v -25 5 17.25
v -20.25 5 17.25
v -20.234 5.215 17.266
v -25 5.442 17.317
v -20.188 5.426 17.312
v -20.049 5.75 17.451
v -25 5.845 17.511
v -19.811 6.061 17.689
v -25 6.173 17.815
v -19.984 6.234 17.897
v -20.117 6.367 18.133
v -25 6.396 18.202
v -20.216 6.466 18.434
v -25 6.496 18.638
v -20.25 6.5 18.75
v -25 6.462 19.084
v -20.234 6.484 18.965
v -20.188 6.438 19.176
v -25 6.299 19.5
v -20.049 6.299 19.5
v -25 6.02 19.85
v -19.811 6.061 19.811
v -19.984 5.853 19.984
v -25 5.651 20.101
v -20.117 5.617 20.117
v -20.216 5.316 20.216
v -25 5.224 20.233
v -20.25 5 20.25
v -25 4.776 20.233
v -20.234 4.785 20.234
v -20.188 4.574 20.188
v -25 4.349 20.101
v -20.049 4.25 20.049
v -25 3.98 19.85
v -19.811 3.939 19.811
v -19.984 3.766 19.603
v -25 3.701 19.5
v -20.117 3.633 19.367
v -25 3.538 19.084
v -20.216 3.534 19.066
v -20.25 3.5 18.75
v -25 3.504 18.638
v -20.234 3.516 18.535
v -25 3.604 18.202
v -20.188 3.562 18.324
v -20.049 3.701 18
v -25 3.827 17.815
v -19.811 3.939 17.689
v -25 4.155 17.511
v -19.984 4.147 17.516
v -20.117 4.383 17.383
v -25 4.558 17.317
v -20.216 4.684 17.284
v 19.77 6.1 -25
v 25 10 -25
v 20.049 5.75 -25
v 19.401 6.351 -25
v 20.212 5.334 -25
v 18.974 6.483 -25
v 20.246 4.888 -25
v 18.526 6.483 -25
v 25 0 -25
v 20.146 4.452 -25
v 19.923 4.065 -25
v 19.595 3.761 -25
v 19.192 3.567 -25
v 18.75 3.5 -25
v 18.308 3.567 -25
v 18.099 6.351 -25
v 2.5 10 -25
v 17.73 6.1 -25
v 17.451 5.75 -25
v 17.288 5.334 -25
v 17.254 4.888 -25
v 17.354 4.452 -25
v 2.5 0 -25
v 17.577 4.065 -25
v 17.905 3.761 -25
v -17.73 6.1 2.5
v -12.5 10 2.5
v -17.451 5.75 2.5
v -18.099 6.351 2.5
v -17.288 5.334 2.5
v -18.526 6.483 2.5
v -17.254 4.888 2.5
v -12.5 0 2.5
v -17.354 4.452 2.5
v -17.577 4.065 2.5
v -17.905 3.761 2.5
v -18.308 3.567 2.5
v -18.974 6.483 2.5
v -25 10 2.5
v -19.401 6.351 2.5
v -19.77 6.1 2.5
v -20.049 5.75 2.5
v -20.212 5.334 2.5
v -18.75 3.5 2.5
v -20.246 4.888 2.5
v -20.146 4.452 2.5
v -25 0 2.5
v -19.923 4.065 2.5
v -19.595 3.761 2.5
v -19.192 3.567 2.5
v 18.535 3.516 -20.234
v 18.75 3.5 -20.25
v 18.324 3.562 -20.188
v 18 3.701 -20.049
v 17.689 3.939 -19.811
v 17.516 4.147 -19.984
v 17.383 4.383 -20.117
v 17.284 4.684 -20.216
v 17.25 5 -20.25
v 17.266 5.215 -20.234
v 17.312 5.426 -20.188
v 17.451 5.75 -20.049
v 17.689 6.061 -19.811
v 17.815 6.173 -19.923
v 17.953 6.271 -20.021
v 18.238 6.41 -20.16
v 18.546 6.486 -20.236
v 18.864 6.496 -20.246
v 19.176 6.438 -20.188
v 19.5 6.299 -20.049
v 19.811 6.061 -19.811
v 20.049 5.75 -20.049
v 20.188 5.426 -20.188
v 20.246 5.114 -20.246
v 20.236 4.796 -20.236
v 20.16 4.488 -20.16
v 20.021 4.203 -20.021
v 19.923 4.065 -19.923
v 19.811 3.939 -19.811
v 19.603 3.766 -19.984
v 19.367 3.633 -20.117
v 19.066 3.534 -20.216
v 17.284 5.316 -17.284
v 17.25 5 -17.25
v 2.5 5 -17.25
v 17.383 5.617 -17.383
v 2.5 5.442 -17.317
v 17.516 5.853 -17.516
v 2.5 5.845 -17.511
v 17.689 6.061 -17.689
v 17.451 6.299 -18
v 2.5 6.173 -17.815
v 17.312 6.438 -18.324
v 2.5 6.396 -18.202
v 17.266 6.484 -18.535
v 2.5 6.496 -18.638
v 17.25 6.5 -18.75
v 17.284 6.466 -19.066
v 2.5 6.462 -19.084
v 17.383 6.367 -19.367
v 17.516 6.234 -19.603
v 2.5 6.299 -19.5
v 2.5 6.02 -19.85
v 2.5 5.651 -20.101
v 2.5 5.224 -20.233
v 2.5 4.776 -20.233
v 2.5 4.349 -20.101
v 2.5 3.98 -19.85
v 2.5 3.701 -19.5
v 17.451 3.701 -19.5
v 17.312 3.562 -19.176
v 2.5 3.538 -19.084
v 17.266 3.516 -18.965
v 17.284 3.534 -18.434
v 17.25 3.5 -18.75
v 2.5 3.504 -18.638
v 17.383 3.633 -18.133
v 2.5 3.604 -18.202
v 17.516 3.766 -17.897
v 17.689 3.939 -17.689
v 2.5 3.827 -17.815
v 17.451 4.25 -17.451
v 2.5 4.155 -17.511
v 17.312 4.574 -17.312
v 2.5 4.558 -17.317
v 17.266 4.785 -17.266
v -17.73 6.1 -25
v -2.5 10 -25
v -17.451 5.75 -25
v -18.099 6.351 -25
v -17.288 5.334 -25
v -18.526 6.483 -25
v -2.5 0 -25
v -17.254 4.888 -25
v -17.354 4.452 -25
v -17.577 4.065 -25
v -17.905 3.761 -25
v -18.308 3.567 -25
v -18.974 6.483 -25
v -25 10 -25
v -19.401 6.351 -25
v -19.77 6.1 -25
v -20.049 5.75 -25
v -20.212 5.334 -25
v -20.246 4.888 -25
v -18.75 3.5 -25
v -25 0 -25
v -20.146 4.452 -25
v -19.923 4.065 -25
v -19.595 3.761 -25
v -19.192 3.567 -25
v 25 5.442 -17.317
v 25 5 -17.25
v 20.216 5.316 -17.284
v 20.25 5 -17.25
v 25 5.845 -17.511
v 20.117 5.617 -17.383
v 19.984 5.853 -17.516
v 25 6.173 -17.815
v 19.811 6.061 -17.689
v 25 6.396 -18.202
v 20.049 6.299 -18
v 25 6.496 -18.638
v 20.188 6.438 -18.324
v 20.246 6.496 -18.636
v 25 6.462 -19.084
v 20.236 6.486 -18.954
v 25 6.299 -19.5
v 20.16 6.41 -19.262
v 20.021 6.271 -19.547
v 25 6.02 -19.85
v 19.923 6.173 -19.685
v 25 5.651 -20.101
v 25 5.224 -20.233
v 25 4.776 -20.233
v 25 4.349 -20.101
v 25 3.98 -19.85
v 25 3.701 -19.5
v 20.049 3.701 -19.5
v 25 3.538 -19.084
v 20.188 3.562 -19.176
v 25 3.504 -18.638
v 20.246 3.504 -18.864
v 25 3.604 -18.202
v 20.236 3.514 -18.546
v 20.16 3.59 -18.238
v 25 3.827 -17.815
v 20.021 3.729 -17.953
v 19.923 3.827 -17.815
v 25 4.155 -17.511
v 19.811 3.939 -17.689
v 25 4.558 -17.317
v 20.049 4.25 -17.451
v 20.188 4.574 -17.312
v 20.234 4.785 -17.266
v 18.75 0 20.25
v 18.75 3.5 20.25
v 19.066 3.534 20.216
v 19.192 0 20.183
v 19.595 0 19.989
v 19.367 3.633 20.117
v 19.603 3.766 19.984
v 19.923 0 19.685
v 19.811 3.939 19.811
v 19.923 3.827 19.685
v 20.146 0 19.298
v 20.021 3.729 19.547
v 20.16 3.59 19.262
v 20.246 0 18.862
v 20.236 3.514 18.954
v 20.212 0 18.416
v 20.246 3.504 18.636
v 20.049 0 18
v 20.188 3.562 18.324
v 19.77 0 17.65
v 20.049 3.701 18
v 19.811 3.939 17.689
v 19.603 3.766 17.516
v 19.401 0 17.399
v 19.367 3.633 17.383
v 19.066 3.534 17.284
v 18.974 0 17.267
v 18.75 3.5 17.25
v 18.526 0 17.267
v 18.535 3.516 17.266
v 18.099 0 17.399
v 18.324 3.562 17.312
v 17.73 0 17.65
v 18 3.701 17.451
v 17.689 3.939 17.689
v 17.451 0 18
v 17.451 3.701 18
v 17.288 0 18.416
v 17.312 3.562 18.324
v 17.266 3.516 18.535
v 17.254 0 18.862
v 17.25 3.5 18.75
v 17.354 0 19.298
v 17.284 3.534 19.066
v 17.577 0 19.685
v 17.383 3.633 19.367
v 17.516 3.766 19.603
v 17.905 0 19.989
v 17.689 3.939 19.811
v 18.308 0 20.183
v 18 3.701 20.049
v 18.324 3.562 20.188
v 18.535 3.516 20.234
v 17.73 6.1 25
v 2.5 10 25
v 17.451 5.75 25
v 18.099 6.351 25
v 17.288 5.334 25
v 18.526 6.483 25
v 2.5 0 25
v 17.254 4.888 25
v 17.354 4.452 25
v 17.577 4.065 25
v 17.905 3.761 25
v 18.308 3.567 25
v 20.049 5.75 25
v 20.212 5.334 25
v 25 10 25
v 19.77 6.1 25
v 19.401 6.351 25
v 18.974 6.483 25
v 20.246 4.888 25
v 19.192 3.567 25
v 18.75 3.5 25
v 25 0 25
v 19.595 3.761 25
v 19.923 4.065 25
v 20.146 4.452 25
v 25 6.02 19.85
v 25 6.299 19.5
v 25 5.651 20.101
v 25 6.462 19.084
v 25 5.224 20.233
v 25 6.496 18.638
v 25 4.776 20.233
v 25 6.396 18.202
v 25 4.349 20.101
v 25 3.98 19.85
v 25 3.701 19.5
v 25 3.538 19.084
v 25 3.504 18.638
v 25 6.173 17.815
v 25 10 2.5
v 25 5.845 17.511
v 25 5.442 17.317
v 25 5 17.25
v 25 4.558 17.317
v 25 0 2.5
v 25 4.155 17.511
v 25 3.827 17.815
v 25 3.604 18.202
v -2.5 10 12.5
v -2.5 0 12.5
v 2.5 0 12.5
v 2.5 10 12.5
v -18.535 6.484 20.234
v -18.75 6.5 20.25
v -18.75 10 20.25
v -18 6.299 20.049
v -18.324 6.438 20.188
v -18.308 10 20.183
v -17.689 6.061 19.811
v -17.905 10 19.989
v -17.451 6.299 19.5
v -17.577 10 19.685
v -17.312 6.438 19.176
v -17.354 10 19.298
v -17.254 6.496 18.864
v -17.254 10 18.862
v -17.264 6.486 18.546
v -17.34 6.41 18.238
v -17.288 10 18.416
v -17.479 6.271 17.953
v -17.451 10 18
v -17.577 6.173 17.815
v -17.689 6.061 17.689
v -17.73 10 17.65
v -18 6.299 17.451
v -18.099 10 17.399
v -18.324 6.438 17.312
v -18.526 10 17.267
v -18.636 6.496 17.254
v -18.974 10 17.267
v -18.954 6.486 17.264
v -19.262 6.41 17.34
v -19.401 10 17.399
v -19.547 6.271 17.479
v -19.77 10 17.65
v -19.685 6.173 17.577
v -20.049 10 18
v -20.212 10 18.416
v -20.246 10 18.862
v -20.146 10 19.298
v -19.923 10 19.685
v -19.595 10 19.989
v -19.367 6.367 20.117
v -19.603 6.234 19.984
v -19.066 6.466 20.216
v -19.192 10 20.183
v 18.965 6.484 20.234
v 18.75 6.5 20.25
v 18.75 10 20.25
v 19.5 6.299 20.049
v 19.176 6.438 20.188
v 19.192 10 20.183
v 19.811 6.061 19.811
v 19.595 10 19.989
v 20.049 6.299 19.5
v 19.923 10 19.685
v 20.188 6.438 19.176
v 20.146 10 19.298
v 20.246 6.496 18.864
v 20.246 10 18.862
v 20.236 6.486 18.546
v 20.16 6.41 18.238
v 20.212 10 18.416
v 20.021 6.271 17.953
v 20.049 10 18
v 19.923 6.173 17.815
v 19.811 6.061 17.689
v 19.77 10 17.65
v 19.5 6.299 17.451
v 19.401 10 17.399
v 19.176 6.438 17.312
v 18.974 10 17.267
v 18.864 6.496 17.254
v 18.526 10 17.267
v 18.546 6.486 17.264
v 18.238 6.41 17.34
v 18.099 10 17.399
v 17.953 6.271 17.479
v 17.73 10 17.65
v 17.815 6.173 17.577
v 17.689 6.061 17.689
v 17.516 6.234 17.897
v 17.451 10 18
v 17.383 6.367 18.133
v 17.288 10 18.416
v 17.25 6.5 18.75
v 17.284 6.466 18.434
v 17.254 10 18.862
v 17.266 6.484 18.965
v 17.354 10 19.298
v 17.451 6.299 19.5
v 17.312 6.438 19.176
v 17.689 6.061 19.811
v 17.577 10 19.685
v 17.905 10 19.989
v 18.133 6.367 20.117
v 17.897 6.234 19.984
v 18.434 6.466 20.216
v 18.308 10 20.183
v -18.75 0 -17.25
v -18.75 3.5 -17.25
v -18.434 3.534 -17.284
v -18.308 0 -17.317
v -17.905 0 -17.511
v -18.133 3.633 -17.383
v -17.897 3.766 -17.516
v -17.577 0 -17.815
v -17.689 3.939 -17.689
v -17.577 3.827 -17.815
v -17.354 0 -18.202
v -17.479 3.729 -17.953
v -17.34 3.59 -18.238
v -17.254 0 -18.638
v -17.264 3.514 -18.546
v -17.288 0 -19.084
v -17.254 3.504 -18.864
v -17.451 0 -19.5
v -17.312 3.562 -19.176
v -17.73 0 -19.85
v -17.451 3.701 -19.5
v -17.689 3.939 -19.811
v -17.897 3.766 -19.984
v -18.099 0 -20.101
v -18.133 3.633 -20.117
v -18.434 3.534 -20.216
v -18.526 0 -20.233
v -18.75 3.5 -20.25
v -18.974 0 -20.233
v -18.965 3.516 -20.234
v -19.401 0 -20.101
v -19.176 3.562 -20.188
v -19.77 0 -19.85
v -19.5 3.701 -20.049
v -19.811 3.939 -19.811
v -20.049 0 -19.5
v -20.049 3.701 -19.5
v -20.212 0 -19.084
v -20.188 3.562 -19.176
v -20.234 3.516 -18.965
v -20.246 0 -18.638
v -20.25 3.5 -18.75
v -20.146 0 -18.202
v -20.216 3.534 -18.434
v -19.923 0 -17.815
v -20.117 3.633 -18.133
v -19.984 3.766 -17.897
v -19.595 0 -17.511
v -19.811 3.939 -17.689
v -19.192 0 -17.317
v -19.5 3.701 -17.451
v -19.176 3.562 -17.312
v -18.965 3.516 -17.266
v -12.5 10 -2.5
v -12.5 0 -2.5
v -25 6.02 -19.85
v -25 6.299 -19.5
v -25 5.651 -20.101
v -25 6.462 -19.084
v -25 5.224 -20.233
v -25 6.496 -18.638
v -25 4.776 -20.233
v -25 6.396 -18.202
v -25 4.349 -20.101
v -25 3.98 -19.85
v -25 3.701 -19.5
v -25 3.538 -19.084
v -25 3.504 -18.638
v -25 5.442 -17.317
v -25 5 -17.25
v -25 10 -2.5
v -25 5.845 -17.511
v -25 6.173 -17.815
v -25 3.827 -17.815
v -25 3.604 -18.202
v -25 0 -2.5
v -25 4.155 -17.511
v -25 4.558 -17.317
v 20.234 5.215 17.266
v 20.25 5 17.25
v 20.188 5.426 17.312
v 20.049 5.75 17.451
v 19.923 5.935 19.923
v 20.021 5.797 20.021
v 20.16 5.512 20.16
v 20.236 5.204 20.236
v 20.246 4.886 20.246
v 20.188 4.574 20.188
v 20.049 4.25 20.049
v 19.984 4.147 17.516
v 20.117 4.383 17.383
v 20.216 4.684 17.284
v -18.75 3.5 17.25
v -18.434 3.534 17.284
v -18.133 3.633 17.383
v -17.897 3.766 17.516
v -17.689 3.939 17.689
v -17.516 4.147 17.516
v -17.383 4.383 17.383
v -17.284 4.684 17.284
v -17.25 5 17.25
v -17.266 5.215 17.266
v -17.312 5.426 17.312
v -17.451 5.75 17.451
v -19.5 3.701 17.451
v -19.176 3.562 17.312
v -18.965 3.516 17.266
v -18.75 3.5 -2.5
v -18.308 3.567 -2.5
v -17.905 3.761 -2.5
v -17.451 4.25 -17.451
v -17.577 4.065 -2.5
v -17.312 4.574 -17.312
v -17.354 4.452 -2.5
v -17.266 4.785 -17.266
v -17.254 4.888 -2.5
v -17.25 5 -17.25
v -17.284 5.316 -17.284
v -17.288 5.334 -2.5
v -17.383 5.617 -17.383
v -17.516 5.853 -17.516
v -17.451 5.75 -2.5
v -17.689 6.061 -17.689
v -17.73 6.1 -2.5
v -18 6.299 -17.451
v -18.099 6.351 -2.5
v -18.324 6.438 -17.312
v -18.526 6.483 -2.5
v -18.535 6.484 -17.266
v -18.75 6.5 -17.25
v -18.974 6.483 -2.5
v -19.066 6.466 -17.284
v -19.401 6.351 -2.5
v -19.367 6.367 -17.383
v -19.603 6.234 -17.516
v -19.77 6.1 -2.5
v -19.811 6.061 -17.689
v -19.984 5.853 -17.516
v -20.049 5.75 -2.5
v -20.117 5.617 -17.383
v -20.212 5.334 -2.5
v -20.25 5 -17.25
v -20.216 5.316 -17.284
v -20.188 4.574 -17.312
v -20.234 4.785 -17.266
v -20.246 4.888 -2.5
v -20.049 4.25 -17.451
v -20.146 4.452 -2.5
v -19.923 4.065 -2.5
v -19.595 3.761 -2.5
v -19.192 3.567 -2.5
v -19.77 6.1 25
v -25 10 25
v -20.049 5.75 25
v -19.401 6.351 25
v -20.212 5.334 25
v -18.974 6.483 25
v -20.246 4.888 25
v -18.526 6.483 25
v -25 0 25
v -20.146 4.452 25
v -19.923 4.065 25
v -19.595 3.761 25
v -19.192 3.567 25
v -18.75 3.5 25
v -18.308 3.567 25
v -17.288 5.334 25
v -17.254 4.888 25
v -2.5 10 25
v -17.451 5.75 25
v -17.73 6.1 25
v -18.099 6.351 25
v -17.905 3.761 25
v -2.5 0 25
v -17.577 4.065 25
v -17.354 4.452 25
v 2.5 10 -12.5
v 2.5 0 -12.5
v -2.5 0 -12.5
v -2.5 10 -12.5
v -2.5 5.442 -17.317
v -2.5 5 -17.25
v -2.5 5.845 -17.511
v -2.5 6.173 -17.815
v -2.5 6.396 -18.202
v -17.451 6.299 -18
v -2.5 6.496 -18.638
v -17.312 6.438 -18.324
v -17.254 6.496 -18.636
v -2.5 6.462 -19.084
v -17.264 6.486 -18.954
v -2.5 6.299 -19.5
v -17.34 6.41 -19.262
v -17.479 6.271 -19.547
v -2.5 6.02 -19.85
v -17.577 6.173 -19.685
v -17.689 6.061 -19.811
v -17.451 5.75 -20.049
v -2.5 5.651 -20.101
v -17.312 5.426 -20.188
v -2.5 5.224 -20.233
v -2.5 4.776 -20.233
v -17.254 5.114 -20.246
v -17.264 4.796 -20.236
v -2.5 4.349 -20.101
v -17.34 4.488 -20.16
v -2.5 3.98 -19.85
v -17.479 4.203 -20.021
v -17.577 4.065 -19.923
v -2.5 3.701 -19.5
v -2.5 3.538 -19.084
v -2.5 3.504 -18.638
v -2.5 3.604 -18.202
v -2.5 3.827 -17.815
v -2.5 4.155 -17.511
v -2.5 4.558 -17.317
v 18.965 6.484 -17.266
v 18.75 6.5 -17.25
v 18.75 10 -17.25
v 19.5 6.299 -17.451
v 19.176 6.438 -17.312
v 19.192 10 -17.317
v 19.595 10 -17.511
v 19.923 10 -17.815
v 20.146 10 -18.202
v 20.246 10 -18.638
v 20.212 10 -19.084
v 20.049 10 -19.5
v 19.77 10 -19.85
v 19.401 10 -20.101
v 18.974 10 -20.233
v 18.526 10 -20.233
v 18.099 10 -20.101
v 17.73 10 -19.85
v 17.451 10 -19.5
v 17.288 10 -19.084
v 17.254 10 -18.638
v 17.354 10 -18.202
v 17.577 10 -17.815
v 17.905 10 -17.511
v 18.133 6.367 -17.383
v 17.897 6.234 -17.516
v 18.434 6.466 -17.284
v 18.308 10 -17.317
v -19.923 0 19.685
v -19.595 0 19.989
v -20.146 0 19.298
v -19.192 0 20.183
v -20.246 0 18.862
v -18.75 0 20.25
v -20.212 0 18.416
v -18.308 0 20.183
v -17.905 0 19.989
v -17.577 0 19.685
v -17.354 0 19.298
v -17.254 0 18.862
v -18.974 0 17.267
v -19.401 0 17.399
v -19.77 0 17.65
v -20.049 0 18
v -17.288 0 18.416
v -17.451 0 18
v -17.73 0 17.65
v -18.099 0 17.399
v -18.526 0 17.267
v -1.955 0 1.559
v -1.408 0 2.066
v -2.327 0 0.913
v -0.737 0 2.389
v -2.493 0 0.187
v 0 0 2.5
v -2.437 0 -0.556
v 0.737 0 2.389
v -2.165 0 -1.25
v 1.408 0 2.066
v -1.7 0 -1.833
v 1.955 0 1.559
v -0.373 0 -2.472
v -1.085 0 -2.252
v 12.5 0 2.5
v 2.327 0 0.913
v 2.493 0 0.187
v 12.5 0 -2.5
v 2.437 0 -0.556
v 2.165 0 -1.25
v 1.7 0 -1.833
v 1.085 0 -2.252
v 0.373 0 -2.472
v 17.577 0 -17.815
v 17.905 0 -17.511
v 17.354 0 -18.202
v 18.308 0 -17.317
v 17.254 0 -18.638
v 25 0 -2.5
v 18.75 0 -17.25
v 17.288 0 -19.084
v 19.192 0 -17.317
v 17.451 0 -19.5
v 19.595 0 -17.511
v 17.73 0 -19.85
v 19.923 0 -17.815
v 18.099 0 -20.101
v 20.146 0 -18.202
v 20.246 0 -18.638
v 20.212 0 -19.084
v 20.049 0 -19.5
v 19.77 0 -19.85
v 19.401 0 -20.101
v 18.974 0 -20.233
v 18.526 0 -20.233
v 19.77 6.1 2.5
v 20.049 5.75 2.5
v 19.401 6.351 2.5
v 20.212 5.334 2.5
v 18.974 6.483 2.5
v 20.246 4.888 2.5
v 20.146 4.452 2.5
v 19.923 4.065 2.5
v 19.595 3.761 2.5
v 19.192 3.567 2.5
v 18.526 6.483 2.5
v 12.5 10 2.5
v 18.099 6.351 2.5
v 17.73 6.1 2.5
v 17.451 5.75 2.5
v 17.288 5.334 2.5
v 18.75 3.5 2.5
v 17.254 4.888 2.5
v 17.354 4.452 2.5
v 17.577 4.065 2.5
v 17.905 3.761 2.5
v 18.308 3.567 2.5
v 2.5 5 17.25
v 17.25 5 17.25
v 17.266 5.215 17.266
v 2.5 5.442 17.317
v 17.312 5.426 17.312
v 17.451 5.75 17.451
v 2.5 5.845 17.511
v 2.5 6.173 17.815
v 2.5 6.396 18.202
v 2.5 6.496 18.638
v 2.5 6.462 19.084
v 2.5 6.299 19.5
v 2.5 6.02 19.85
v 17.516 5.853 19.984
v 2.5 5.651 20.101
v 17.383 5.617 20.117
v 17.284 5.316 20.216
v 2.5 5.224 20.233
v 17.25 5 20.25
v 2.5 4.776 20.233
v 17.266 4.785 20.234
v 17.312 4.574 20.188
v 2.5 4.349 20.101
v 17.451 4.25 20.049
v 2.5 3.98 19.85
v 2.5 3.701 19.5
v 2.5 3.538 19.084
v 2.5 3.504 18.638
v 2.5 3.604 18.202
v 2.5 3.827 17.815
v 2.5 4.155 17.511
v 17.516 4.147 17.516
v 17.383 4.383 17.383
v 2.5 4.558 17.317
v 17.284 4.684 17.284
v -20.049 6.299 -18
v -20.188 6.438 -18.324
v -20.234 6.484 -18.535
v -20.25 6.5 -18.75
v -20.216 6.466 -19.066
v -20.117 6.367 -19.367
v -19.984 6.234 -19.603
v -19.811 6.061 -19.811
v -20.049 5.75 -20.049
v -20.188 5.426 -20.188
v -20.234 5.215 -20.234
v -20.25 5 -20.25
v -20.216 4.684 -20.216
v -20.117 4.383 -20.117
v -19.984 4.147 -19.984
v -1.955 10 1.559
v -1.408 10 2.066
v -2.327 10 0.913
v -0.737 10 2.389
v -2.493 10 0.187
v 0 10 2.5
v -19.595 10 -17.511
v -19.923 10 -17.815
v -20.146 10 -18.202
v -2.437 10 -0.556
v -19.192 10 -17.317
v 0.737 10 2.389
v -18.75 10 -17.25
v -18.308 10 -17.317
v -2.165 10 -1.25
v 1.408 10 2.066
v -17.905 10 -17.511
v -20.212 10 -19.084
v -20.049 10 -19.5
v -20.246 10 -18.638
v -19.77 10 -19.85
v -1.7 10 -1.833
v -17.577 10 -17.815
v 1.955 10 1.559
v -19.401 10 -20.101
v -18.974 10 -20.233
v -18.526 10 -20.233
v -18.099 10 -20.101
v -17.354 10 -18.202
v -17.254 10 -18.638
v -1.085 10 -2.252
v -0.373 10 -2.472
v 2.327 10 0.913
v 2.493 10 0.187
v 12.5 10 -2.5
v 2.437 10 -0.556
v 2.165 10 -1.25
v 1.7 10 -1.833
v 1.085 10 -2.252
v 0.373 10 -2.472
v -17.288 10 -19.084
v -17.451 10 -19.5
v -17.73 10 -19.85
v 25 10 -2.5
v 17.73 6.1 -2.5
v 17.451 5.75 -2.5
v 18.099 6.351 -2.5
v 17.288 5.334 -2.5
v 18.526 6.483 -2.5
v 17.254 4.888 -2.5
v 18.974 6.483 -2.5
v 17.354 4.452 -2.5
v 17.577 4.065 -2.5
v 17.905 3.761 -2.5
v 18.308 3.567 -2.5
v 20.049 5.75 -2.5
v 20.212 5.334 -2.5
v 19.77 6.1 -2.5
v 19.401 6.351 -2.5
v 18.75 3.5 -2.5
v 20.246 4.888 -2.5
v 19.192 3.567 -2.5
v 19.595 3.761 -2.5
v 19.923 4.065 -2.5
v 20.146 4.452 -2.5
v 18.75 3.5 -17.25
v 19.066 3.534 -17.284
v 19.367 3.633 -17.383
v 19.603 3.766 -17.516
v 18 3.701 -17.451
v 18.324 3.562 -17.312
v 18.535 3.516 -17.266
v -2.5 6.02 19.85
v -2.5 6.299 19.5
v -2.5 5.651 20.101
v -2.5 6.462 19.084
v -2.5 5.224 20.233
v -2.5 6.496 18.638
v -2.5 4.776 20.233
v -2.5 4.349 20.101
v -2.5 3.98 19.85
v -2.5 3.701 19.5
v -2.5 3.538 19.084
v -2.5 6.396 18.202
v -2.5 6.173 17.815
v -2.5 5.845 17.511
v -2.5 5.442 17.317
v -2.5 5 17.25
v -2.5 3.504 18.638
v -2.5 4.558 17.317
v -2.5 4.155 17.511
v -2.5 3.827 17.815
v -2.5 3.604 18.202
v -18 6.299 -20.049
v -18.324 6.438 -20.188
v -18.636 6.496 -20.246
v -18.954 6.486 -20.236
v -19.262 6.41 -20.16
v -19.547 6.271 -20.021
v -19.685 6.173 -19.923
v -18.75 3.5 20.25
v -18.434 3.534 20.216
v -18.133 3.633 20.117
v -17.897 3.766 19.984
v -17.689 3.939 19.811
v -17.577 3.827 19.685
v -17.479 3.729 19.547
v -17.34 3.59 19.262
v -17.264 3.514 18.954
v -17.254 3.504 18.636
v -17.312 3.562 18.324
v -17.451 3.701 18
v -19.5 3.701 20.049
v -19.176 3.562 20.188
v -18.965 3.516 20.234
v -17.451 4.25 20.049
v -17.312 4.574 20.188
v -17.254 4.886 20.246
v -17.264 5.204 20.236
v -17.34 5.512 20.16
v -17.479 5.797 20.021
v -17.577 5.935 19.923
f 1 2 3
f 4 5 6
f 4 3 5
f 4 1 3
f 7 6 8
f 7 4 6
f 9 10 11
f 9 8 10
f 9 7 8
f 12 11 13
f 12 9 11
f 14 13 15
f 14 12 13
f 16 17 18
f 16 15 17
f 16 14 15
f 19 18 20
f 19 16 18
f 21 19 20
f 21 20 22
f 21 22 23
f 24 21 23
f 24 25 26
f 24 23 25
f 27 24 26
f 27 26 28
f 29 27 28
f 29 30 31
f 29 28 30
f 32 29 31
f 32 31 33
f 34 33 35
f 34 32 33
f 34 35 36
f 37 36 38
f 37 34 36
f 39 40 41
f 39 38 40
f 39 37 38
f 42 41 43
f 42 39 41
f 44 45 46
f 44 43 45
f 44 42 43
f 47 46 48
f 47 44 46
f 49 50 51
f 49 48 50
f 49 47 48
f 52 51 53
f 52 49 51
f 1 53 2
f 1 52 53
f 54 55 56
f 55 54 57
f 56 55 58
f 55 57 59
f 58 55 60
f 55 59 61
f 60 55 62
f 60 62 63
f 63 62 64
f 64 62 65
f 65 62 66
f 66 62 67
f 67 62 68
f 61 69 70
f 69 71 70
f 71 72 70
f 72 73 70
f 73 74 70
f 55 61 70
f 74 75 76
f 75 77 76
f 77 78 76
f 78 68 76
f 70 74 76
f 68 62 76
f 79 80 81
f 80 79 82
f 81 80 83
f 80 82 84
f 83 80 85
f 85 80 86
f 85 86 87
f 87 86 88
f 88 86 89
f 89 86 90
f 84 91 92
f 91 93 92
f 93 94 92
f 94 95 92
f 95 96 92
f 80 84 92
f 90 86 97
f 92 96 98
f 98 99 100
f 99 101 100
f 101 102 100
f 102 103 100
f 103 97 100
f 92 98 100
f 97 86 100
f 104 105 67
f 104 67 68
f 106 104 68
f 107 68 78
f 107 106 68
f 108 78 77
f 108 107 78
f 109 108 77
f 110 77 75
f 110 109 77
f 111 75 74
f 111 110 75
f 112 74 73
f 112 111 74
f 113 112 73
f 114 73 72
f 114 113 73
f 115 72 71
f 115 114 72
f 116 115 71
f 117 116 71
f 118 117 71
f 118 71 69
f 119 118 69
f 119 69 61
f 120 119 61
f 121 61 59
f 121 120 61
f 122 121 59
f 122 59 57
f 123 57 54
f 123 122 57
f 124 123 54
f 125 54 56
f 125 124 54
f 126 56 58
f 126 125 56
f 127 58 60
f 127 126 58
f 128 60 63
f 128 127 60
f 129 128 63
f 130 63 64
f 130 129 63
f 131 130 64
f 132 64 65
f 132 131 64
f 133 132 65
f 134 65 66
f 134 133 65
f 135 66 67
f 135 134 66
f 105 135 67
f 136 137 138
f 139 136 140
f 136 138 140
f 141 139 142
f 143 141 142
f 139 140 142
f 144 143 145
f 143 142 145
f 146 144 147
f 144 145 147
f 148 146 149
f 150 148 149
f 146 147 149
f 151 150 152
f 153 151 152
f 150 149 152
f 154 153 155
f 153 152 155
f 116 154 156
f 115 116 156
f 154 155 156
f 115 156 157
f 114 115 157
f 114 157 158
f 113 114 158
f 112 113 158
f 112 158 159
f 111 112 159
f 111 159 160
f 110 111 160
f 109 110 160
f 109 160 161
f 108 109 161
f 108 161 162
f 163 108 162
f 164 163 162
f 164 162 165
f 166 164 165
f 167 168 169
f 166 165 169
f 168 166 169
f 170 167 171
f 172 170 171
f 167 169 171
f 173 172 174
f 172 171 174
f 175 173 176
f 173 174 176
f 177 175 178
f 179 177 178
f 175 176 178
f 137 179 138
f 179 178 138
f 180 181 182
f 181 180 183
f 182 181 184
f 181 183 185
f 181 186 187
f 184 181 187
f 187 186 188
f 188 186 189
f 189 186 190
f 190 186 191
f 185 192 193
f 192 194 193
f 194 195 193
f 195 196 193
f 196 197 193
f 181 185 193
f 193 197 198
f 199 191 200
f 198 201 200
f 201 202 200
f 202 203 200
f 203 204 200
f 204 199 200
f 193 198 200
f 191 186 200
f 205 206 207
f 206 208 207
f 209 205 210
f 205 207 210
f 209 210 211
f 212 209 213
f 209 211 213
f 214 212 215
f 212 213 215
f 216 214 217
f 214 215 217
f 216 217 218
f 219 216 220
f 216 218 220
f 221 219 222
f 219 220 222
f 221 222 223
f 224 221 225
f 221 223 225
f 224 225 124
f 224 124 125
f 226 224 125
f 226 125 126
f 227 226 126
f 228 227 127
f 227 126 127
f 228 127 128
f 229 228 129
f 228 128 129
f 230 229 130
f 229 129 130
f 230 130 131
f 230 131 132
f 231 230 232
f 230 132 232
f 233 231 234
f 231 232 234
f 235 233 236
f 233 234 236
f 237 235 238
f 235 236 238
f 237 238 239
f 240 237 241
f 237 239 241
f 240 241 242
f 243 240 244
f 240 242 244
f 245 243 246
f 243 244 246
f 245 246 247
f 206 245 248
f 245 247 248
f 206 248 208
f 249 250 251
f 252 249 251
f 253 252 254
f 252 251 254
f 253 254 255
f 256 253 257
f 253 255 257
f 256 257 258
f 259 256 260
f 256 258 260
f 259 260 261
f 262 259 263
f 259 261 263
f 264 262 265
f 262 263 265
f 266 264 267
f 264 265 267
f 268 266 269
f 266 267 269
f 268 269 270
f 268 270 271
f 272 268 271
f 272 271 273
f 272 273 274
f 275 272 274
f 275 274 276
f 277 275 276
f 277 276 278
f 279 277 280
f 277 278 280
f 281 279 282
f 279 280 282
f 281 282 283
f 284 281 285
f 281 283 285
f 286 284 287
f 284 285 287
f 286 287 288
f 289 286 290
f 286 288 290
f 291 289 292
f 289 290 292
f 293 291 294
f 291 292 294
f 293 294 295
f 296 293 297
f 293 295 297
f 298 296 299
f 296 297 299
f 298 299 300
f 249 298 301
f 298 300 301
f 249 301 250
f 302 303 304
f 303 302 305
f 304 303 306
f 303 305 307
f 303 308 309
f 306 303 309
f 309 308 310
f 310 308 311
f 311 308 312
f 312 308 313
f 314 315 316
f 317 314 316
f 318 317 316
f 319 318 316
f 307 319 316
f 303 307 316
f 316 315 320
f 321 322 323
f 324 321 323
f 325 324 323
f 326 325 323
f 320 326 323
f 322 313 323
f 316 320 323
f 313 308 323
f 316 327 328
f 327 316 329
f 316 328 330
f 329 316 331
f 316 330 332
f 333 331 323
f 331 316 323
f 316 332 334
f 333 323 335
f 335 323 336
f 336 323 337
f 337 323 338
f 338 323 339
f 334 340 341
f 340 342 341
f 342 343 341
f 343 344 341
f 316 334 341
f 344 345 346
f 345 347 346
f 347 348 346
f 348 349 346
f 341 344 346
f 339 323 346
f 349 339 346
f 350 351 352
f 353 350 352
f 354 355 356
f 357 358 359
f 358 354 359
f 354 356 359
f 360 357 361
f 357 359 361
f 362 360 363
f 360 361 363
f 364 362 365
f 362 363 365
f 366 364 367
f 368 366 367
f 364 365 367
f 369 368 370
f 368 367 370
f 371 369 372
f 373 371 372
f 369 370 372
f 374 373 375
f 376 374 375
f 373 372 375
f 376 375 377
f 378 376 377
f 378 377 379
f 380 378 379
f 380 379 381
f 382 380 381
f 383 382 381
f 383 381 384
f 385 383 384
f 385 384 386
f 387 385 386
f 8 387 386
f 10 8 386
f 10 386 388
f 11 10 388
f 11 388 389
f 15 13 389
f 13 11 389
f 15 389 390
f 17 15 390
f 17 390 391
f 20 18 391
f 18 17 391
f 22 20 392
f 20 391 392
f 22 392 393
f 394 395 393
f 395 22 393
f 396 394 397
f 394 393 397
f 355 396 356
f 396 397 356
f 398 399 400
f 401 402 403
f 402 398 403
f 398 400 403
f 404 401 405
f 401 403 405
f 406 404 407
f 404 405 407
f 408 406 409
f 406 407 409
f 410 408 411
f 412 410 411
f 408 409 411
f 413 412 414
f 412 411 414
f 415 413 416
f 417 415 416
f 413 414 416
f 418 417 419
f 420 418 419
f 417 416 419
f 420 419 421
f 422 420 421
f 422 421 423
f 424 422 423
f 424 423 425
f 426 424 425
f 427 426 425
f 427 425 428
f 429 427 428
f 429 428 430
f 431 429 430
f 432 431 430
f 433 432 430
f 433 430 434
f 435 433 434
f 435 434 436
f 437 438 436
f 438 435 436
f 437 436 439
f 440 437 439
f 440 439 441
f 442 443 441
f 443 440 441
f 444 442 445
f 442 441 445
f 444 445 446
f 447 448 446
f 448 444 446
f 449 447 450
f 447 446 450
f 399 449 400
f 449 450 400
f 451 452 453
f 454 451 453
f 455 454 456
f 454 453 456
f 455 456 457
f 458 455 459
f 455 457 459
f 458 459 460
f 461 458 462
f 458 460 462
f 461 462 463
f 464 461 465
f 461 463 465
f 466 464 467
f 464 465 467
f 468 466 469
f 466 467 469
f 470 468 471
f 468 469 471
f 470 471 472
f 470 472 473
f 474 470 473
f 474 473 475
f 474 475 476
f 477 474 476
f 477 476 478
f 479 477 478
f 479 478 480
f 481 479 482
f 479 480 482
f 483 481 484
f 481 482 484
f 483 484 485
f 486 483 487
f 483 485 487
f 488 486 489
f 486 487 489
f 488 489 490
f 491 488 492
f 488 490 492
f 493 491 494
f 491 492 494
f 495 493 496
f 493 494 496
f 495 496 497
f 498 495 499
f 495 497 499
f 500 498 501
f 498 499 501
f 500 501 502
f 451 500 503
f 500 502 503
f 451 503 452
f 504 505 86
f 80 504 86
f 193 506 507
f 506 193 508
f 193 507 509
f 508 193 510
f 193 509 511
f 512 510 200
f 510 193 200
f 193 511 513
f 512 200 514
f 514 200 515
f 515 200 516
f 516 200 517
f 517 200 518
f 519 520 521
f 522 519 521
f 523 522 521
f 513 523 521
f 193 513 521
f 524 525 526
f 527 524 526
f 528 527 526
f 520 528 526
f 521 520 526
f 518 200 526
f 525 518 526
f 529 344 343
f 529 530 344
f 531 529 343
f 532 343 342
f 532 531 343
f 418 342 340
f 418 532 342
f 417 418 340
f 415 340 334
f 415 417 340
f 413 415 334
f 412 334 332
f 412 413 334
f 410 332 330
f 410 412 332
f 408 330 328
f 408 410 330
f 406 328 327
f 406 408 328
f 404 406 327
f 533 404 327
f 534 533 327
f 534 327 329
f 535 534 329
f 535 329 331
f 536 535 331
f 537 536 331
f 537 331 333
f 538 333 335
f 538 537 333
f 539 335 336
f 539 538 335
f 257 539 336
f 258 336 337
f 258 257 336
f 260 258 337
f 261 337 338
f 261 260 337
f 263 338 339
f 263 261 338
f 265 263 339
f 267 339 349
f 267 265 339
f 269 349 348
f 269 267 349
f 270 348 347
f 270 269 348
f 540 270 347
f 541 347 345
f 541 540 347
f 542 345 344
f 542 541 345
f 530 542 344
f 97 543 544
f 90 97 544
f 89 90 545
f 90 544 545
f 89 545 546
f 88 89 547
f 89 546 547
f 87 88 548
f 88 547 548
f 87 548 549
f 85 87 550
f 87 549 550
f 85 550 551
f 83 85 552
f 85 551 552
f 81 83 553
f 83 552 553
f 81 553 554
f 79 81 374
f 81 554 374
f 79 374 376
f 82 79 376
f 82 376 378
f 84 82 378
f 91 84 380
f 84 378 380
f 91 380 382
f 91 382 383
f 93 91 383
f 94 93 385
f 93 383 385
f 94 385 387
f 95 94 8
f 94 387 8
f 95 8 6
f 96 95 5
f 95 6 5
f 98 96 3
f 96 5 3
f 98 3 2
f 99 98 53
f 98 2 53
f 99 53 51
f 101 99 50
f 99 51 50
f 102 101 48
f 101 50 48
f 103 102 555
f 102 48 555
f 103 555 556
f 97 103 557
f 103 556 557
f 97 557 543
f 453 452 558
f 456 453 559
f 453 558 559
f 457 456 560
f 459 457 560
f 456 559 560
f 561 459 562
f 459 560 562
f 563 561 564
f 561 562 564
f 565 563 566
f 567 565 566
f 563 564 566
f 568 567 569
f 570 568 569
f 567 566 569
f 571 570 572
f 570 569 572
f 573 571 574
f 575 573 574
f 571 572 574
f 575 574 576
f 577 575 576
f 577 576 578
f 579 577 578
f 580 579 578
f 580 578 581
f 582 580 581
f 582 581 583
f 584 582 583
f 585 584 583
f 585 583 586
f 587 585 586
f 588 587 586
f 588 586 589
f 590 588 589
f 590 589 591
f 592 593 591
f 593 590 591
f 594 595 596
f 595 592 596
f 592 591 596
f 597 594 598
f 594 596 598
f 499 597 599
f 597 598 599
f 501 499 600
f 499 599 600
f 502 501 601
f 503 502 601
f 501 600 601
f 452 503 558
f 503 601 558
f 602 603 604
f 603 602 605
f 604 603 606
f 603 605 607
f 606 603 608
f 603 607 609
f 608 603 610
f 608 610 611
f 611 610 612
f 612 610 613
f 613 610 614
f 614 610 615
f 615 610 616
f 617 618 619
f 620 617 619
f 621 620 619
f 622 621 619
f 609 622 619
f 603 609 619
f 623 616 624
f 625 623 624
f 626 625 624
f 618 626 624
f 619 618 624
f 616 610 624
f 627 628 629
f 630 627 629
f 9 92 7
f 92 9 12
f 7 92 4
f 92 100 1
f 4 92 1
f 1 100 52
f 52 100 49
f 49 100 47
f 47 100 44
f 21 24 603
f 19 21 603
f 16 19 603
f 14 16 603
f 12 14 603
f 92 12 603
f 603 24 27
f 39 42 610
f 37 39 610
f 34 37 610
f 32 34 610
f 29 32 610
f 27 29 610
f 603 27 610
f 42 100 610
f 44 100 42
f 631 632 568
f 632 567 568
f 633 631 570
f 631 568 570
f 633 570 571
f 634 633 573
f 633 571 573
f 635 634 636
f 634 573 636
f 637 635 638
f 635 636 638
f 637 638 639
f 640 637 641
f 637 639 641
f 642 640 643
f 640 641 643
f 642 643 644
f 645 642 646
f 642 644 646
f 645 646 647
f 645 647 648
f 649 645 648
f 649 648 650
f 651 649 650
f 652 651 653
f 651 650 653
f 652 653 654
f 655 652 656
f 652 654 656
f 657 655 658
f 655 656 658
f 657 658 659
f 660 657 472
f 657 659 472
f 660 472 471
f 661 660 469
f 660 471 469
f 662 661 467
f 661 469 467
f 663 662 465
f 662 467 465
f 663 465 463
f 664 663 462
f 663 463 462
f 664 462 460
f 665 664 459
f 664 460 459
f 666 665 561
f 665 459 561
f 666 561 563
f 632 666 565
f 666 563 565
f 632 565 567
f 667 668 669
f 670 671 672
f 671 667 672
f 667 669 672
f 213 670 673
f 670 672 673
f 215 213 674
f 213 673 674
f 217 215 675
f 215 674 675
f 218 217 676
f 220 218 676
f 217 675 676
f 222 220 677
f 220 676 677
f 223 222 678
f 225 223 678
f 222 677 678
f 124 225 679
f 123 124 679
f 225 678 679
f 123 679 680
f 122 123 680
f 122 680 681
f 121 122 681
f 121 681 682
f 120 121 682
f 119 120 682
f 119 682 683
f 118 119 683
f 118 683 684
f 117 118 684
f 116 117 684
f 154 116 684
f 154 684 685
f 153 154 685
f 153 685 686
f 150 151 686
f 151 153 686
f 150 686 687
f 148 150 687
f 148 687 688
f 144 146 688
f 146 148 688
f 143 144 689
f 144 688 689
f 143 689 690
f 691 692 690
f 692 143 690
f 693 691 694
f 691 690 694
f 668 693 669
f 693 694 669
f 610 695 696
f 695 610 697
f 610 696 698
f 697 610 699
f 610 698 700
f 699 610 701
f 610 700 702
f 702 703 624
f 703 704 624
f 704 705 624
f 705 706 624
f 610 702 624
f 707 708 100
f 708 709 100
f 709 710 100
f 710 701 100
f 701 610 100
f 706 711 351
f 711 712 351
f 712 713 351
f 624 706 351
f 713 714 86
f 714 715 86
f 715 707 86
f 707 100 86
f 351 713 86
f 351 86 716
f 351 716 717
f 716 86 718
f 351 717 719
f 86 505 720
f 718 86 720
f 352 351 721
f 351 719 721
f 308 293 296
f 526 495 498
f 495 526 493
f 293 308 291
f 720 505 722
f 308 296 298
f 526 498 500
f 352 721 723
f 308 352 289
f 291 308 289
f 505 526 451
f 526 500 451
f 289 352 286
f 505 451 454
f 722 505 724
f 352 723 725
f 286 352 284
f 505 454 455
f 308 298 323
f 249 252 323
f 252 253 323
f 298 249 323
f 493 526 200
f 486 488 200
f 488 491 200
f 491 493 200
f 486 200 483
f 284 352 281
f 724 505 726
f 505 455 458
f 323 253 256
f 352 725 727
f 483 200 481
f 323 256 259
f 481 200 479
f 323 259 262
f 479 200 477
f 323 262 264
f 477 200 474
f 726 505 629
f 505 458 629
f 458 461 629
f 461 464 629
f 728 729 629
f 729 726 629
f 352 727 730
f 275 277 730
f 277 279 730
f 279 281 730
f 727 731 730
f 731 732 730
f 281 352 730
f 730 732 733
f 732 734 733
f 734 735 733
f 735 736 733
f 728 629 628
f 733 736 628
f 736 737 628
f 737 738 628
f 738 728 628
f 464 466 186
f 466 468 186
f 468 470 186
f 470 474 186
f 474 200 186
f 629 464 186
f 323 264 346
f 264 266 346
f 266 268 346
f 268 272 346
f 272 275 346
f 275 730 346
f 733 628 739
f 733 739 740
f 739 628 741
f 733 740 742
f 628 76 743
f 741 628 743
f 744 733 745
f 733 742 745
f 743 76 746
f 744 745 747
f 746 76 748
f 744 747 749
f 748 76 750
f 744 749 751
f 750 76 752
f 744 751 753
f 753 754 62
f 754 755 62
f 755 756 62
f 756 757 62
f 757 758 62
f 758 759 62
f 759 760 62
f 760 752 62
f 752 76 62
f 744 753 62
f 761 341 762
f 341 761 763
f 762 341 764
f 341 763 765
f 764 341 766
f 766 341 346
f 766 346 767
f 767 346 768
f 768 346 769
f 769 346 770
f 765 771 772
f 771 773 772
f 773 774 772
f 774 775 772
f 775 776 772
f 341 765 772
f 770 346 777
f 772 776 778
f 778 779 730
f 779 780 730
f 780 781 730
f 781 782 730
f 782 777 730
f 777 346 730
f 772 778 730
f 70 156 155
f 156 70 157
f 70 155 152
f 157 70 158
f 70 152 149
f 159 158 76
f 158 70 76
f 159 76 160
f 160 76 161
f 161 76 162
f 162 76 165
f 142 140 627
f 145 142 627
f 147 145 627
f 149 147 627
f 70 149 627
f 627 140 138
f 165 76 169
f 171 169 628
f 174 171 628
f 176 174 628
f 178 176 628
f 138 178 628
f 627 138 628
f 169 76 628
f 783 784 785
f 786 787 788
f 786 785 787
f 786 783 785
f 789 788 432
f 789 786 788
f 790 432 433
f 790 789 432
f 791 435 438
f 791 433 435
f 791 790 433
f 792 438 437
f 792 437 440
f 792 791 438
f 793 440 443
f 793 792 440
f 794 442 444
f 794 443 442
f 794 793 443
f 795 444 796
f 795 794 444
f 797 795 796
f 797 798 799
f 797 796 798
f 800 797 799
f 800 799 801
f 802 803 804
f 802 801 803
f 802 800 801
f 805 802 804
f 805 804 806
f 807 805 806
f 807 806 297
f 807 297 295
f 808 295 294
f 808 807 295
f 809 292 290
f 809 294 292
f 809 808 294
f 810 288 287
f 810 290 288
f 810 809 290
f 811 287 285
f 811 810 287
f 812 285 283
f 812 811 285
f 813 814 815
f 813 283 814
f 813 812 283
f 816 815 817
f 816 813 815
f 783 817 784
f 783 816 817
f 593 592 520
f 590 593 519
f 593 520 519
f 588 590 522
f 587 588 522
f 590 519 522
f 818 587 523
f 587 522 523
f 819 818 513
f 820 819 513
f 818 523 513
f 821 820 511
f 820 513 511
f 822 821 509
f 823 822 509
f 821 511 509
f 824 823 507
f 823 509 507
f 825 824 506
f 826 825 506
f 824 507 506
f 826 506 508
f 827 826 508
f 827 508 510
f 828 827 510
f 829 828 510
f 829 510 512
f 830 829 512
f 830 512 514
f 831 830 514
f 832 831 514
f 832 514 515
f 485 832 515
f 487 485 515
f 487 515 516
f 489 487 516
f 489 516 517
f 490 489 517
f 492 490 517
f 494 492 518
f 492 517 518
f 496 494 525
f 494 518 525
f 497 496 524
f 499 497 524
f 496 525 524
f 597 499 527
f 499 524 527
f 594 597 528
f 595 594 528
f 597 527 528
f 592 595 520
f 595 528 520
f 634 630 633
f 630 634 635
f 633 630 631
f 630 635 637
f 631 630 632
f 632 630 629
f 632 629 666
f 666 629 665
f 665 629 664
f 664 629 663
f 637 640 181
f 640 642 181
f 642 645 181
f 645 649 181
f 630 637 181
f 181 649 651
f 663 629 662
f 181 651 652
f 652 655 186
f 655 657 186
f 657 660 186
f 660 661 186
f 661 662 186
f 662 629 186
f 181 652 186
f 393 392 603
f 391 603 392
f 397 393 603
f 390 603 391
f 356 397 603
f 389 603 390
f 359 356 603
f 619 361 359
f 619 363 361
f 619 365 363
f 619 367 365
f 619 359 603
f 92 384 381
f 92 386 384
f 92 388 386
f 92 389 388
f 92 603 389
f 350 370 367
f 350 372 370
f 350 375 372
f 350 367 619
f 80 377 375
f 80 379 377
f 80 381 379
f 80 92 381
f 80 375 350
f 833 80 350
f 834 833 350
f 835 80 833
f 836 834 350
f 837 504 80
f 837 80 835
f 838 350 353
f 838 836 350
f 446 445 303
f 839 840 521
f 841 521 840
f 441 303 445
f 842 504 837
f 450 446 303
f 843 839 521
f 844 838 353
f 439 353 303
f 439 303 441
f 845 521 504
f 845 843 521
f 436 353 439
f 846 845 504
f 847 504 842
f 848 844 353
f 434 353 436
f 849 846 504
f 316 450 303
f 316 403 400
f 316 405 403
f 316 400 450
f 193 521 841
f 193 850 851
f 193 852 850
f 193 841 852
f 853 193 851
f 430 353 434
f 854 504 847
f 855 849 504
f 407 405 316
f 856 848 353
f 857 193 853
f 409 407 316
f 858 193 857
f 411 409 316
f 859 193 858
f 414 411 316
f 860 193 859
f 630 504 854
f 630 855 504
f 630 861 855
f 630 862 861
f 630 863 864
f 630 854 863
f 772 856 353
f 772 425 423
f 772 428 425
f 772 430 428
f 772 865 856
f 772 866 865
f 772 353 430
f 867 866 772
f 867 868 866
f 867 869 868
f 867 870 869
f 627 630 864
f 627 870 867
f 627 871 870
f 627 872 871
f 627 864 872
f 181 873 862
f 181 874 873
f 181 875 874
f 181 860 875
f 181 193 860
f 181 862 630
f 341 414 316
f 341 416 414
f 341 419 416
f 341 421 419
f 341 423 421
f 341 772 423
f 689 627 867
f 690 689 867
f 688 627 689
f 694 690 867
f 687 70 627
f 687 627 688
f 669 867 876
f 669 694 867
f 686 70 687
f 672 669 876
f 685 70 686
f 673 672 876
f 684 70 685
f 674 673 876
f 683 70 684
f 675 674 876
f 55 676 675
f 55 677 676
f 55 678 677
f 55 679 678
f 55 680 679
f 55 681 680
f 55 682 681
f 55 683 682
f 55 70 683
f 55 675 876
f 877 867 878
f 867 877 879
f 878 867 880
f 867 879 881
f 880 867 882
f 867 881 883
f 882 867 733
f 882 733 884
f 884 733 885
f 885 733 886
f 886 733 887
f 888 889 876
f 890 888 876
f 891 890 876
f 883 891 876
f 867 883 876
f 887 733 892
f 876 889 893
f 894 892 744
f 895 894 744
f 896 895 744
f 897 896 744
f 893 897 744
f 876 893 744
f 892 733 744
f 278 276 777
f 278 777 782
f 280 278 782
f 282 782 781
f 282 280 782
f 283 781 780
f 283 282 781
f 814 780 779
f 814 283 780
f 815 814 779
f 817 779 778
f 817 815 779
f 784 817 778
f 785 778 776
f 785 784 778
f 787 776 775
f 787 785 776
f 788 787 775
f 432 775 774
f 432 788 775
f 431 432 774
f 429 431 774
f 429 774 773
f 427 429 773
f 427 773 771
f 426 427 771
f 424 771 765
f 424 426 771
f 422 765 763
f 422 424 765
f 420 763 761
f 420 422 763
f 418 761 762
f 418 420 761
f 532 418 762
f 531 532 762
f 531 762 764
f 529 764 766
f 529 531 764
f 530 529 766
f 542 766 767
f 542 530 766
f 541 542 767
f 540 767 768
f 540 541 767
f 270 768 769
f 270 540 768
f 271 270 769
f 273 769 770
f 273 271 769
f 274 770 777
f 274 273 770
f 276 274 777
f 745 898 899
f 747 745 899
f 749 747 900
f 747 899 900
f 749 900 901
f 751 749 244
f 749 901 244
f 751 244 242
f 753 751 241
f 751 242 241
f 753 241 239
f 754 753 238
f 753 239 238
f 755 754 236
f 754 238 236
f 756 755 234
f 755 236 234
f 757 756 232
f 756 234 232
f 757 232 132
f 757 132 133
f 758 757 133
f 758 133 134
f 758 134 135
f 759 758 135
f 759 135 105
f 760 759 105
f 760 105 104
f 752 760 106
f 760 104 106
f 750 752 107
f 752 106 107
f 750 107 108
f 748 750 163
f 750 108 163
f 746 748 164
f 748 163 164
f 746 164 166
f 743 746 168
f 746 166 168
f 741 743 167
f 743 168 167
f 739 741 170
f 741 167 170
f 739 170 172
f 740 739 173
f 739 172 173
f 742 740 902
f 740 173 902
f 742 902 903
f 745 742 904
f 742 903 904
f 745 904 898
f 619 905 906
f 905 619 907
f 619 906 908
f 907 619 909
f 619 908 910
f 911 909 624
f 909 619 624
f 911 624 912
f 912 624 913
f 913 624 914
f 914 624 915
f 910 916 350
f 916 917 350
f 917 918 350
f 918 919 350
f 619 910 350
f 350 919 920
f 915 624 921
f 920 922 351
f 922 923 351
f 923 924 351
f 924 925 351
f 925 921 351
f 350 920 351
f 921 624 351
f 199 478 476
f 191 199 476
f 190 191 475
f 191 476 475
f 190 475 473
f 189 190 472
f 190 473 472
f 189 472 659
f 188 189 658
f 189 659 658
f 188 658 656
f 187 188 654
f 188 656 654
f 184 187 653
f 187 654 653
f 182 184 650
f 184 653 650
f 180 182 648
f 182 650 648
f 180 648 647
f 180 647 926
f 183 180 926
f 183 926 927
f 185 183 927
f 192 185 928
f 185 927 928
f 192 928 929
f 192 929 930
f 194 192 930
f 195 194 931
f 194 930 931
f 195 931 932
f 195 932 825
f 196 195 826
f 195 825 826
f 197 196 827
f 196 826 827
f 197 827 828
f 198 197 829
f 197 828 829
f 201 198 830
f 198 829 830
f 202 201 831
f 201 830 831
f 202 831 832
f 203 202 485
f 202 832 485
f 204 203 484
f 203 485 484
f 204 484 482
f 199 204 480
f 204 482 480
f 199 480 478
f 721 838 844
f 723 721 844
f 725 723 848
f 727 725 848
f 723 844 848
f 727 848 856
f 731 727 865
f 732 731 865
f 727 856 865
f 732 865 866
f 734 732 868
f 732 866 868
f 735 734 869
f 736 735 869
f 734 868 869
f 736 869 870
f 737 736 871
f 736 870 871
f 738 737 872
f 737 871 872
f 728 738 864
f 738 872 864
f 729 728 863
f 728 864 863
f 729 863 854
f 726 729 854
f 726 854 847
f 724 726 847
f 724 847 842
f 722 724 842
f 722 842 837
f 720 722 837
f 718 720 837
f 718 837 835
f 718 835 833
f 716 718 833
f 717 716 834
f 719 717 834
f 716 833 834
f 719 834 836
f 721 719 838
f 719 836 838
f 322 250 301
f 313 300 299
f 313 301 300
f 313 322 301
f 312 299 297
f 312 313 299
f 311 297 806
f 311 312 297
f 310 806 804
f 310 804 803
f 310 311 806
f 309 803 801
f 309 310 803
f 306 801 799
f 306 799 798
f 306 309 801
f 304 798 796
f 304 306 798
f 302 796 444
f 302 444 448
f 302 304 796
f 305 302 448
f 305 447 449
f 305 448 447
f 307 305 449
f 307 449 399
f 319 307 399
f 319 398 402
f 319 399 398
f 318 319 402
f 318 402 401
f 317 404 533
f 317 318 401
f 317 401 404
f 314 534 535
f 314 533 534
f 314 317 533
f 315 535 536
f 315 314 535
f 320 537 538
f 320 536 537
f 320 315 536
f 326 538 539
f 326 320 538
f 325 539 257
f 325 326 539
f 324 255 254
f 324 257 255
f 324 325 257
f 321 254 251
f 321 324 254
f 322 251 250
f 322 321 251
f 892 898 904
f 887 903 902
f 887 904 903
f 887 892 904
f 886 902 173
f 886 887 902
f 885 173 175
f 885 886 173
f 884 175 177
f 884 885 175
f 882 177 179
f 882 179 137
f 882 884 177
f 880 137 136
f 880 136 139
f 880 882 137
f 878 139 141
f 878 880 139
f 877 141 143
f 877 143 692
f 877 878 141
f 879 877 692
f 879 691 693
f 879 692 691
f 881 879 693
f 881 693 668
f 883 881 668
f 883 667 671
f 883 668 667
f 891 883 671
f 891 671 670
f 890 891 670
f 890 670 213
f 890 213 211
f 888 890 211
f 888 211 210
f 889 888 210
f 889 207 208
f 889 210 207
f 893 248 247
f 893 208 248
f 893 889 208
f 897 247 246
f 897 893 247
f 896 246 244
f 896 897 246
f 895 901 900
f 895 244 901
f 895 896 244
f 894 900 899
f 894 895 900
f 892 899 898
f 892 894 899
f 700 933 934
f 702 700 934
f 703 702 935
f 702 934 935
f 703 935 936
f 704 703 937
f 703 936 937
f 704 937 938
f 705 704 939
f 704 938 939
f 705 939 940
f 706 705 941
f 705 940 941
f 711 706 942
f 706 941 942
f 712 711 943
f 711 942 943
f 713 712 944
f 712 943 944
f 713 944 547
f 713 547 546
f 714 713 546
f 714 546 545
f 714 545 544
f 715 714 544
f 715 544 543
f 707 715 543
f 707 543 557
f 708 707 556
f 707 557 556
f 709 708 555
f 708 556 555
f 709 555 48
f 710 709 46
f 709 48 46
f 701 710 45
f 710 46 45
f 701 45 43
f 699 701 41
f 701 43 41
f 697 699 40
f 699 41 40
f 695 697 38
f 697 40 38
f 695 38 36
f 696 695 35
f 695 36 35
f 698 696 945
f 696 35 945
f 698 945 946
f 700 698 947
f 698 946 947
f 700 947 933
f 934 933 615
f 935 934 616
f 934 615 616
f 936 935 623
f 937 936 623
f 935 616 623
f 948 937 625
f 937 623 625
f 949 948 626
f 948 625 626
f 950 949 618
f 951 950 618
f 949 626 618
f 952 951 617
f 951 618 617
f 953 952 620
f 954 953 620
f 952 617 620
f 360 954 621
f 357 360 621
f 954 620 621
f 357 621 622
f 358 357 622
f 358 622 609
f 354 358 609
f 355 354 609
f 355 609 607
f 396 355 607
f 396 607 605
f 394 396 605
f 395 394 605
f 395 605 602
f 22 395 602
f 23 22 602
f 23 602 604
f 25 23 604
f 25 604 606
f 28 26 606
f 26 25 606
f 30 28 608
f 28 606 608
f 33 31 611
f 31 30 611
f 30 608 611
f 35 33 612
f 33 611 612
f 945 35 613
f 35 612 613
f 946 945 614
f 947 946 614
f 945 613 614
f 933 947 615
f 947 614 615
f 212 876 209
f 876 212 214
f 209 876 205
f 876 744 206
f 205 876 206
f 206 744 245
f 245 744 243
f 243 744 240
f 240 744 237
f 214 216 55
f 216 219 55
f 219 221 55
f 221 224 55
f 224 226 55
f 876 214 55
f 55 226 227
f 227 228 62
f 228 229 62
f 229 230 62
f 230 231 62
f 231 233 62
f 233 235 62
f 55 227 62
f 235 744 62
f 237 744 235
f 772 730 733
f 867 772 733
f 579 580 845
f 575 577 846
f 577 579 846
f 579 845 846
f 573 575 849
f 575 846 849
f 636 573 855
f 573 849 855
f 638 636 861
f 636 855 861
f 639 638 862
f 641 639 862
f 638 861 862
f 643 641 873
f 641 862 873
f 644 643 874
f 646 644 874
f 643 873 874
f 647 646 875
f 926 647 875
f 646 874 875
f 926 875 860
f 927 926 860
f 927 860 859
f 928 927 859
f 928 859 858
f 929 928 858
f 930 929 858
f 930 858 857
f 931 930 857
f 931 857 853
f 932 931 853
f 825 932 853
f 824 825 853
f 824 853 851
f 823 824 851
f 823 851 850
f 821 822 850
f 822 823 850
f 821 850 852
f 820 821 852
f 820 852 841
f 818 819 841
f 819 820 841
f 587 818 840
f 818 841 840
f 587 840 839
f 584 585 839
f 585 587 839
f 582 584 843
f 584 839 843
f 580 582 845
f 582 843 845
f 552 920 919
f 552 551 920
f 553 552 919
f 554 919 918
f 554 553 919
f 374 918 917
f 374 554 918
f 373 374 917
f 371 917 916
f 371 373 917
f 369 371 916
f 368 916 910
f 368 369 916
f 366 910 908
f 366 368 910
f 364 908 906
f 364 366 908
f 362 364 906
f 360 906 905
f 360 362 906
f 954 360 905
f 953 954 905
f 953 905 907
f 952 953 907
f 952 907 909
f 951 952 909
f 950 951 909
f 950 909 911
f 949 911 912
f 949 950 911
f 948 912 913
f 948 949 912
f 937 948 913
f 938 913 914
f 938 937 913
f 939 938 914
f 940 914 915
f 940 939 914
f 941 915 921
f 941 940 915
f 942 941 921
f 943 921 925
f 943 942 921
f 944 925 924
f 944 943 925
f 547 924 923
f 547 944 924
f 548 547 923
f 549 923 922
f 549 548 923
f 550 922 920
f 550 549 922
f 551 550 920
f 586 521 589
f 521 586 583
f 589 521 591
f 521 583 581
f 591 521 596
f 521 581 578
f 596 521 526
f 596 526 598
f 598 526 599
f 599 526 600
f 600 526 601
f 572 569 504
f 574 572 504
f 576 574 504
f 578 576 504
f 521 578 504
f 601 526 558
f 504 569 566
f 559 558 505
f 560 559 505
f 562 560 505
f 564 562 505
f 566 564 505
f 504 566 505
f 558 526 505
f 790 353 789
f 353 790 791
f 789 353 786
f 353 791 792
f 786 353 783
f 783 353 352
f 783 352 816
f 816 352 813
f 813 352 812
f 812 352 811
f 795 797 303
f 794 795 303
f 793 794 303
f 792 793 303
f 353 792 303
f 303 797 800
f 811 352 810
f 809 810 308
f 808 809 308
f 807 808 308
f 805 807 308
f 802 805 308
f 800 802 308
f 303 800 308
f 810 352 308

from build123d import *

# Parameters (mm, degrees)
BOSS_EXTRUDE1_DEPTH = 10
SKETCH3_R           = 1.5
CUT_EXTRUDE1_DEPTH  = 39.487010796
SKETCH4_R           = 1.5
CUT_EXTRUDE2_DEPTH  = 39.487010796
SKETCH5_R           = 2.5
CUT_EXTRUDE3_DEPTH  = 10
SKETCH9_R           = 1.5
CUT_EXTRUDE4_DEPTH  = 37.742346142


with BuildPart() as part:
    # Sketch1 → Boss-Extrude1 (new body)
    with BuildSketch(Plane(origin=(0, 0, 0), x_dir=(1, 0, 0), z_dir=(0, 1, 0))):
        Polygon((-2.5, 12.5), (-2.5, 25), (-25, 25), (-25, 2.5), (-12.5, 2.5), (-12.5, -2.5), (-25, -2.5), (-25, -25), (-2.5, -25), (-2.5, -12.5), (2.5, -12.5), (2.5, -25), (25, -25), (25, -2.5), (12.5, -2.5), (12.5, 2.5), (25, 2.5), (25, 25), (2.5, 25), (2.5, 12.5), align=None)
    extrude(amount=BOSS_EXTRUDE1_DEPTH)

    # Sketch3 → Cut-Extrude1 (cut, symmetric)
    with BuildSketch(Plane.ZY.offset(2.5)):
        with Locations((-18.75, 5)):
            Circle(SKETCH3_R)
    cut_extrude1 = extrude(amount=CUT_EXTRUDE1_DEPTH, both=True, mode=Mode.SUBTRACT)

    # Mirror1: Cut-Extrude1 across plane
    add(cut_extrude1.mirror(Plane.XY), mode=Mode.SUBTRACT)

    # Sketch4 → Cut-Extrude2 (cut, symmetric)
    with BuildSketch(Plane.XY.offset(2.5)):
        with Locations(Location((-18.75, 5, 0), (0, 0, 270))):
            Circle(SKETCH4_R)
    cut_extrude2 = extrude(amount=CUT_EXTRUDE2_DEPTH, both=True, mode=Mode.SUBTRACT)

    # Mirror2: Cut-Extrude2 across plane
    add(cut_extrude2.mirror(Plane(origin=(0, 0, 0), x_dir=(0, 0, 1), z_dir=(1, 0, 0))), mode=Mode.SUBTRACT)

    # Sketch5 → Cut-Extrude3 (cut)
    with BuildSketch(Plane(origin=(0, 10, 0), x_dir=(1, 0, 0), z_dir=(0, 1, 0))):
        with Locations(Location((0, 0, 0), (0, 0, 270))):
            Circle(SKETCH5_R)
    extrude(amount=-CUT_EXTRUDE3_DEPTH, mode=Mode.SUBTRACT)

    # Sketch9 → Cut-Extrude4 (cut, through all)
    with BuildSketch(Plane(origin=(0, 10, 0), x_dir=(1, 0, 0), z_dir=(0, 1, 0))):
        with Locations(Location((-18.75, 18.75, 0), (0, 0, 270))):
            Circle(SKETCH9_R)
        with Locations(Location((18.75, 18.75, 0), (0, 0, 270))):
            Circle(SKETCH9_R)
        with Locations(Location((18.75, -18.75, 0), (0, 0, 270))):
            Circle(SKETCH9_R)
        with Locations(Location((-18.75, -18.75, 0), (0, 0, 270))):
            Circle(SKETCH9_R)
    extrude(amount=-CUT_EXTRUDE4_DEPTH, mode=Mode.SUBTRACT)


solid = part.part
